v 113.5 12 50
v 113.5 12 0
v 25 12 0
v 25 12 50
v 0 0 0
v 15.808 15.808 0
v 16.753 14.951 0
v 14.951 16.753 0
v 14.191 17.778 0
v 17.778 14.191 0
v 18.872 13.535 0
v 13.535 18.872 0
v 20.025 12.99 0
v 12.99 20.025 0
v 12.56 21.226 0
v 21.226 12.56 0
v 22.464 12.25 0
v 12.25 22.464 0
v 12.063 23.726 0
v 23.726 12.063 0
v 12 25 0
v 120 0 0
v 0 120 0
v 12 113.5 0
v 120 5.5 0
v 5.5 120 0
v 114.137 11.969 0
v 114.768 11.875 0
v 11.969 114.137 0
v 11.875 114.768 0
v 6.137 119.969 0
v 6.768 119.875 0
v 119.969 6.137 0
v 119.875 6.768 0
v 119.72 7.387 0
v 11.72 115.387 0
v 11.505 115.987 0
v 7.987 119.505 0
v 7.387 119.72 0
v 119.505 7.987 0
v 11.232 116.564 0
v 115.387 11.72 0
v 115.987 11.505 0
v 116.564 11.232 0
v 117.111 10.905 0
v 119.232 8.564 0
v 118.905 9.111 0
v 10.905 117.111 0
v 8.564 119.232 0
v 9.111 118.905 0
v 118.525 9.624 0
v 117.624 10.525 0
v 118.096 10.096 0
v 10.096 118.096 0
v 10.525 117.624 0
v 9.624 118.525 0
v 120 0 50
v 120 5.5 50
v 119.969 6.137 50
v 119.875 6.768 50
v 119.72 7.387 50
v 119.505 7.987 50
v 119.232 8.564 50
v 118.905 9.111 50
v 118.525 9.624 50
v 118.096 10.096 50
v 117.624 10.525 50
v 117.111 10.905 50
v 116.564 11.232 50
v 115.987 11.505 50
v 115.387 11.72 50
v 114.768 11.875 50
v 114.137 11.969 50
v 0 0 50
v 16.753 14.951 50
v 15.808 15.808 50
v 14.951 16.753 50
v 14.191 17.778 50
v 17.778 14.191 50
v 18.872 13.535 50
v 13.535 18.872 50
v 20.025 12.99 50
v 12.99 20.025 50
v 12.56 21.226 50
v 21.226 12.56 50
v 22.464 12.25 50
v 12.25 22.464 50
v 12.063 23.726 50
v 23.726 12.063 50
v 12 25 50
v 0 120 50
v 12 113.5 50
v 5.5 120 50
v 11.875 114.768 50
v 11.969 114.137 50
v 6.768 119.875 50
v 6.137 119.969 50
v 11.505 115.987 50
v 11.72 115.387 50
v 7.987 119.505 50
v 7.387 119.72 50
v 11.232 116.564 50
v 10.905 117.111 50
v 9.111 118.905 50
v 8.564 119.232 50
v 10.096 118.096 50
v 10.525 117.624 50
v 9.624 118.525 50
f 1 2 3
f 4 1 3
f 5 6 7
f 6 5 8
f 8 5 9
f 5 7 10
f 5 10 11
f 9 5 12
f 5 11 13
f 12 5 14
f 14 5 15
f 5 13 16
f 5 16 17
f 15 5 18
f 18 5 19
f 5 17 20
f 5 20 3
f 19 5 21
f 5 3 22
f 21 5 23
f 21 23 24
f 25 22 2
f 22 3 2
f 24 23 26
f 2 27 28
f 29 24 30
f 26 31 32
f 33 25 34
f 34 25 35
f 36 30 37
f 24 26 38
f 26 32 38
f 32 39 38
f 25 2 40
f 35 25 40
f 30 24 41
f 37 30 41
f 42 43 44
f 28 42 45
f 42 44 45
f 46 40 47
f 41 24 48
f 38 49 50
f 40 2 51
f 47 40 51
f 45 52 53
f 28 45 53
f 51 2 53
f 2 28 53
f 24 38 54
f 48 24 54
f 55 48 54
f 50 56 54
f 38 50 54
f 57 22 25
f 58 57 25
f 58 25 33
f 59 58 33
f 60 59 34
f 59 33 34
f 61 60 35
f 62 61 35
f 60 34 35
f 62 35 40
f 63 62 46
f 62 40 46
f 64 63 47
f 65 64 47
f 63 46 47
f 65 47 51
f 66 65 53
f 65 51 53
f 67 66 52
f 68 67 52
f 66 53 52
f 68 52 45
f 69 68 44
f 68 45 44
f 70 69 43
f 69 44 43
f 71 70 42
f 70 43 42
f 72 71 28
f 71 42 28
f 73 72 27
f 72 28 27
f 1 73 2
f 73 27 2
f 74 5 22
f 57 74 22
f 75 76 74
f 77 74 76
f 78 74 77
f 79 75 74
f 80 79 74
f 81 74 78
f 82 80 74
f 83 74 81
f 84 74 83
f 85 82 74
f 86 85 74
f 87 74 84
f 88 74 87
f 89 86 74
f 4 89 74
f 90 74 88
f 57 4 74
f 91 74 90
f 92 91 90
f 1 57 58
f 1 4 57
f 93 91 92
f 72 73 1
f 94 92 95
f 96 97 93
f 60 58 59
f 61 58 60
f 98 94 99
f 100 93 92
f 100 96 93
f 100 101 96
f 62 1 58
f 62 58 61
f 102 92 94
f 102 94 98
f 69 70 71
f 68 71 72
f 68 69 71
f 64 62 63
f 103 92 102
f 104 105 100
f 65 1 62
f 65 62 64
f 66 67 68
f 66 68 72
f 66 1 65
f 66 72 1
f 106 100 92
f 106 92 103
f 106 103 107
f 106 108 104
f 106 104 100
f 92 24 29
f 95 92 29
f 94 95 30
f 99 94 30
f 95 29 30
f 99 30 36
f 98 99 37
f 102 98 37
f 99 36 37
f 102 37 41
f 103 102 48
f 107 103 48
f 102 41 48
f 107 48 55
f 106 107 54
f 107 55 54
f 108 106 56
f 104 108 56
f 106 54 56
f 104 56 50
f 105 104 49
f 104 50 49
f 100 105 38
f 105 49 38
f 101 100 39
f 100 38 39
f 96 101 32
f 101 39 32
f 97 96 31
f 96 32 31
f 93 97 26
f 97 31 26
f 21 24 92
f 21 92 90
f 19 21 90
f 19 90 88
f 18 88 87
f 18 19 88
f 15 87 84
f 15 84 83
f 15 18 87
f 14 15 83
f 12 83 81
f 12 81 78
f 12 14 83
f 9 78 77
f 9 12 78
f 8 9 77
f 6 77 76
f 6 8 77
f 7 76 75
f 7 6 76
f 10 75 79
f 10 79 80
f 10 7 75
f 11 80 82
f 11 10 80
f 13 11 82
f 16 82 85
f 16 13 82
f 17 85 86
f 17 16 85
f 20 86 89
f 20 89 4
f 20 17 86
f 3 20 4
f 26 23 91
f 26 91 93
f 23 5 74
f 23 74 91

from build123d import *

# Parameters (mm, degrees)
EXTRUDE_DEPTH = 50


with BuildPart() as part:
    # Sketch → Extrude (new body)
    with BuildSketch(Plane.XY):
        with BuildLine():
            Line((0, 0), (120, 0))
            Line((120, 0), (120, 5.5))
            ThreePointArc((120, 5.5), (118.096194, 10.096194), (113.5, 12))
            Line((113.5, 12), (25, 12))
            ThreePointArc((12, 25), (15.807612, 15.807612), (25, 12))
            Line((12, 113.5), (12, 25))
            ThreePointArc((12, 113.5), (10.096194, 118.096194), (5.5, 120))
            Line((0, 120), (5.5, 120))
            Line((0, 0), (0, 120))
        make_face()
    extrude(amount=EXTRUDE_DEPTH)


solid = part.part
